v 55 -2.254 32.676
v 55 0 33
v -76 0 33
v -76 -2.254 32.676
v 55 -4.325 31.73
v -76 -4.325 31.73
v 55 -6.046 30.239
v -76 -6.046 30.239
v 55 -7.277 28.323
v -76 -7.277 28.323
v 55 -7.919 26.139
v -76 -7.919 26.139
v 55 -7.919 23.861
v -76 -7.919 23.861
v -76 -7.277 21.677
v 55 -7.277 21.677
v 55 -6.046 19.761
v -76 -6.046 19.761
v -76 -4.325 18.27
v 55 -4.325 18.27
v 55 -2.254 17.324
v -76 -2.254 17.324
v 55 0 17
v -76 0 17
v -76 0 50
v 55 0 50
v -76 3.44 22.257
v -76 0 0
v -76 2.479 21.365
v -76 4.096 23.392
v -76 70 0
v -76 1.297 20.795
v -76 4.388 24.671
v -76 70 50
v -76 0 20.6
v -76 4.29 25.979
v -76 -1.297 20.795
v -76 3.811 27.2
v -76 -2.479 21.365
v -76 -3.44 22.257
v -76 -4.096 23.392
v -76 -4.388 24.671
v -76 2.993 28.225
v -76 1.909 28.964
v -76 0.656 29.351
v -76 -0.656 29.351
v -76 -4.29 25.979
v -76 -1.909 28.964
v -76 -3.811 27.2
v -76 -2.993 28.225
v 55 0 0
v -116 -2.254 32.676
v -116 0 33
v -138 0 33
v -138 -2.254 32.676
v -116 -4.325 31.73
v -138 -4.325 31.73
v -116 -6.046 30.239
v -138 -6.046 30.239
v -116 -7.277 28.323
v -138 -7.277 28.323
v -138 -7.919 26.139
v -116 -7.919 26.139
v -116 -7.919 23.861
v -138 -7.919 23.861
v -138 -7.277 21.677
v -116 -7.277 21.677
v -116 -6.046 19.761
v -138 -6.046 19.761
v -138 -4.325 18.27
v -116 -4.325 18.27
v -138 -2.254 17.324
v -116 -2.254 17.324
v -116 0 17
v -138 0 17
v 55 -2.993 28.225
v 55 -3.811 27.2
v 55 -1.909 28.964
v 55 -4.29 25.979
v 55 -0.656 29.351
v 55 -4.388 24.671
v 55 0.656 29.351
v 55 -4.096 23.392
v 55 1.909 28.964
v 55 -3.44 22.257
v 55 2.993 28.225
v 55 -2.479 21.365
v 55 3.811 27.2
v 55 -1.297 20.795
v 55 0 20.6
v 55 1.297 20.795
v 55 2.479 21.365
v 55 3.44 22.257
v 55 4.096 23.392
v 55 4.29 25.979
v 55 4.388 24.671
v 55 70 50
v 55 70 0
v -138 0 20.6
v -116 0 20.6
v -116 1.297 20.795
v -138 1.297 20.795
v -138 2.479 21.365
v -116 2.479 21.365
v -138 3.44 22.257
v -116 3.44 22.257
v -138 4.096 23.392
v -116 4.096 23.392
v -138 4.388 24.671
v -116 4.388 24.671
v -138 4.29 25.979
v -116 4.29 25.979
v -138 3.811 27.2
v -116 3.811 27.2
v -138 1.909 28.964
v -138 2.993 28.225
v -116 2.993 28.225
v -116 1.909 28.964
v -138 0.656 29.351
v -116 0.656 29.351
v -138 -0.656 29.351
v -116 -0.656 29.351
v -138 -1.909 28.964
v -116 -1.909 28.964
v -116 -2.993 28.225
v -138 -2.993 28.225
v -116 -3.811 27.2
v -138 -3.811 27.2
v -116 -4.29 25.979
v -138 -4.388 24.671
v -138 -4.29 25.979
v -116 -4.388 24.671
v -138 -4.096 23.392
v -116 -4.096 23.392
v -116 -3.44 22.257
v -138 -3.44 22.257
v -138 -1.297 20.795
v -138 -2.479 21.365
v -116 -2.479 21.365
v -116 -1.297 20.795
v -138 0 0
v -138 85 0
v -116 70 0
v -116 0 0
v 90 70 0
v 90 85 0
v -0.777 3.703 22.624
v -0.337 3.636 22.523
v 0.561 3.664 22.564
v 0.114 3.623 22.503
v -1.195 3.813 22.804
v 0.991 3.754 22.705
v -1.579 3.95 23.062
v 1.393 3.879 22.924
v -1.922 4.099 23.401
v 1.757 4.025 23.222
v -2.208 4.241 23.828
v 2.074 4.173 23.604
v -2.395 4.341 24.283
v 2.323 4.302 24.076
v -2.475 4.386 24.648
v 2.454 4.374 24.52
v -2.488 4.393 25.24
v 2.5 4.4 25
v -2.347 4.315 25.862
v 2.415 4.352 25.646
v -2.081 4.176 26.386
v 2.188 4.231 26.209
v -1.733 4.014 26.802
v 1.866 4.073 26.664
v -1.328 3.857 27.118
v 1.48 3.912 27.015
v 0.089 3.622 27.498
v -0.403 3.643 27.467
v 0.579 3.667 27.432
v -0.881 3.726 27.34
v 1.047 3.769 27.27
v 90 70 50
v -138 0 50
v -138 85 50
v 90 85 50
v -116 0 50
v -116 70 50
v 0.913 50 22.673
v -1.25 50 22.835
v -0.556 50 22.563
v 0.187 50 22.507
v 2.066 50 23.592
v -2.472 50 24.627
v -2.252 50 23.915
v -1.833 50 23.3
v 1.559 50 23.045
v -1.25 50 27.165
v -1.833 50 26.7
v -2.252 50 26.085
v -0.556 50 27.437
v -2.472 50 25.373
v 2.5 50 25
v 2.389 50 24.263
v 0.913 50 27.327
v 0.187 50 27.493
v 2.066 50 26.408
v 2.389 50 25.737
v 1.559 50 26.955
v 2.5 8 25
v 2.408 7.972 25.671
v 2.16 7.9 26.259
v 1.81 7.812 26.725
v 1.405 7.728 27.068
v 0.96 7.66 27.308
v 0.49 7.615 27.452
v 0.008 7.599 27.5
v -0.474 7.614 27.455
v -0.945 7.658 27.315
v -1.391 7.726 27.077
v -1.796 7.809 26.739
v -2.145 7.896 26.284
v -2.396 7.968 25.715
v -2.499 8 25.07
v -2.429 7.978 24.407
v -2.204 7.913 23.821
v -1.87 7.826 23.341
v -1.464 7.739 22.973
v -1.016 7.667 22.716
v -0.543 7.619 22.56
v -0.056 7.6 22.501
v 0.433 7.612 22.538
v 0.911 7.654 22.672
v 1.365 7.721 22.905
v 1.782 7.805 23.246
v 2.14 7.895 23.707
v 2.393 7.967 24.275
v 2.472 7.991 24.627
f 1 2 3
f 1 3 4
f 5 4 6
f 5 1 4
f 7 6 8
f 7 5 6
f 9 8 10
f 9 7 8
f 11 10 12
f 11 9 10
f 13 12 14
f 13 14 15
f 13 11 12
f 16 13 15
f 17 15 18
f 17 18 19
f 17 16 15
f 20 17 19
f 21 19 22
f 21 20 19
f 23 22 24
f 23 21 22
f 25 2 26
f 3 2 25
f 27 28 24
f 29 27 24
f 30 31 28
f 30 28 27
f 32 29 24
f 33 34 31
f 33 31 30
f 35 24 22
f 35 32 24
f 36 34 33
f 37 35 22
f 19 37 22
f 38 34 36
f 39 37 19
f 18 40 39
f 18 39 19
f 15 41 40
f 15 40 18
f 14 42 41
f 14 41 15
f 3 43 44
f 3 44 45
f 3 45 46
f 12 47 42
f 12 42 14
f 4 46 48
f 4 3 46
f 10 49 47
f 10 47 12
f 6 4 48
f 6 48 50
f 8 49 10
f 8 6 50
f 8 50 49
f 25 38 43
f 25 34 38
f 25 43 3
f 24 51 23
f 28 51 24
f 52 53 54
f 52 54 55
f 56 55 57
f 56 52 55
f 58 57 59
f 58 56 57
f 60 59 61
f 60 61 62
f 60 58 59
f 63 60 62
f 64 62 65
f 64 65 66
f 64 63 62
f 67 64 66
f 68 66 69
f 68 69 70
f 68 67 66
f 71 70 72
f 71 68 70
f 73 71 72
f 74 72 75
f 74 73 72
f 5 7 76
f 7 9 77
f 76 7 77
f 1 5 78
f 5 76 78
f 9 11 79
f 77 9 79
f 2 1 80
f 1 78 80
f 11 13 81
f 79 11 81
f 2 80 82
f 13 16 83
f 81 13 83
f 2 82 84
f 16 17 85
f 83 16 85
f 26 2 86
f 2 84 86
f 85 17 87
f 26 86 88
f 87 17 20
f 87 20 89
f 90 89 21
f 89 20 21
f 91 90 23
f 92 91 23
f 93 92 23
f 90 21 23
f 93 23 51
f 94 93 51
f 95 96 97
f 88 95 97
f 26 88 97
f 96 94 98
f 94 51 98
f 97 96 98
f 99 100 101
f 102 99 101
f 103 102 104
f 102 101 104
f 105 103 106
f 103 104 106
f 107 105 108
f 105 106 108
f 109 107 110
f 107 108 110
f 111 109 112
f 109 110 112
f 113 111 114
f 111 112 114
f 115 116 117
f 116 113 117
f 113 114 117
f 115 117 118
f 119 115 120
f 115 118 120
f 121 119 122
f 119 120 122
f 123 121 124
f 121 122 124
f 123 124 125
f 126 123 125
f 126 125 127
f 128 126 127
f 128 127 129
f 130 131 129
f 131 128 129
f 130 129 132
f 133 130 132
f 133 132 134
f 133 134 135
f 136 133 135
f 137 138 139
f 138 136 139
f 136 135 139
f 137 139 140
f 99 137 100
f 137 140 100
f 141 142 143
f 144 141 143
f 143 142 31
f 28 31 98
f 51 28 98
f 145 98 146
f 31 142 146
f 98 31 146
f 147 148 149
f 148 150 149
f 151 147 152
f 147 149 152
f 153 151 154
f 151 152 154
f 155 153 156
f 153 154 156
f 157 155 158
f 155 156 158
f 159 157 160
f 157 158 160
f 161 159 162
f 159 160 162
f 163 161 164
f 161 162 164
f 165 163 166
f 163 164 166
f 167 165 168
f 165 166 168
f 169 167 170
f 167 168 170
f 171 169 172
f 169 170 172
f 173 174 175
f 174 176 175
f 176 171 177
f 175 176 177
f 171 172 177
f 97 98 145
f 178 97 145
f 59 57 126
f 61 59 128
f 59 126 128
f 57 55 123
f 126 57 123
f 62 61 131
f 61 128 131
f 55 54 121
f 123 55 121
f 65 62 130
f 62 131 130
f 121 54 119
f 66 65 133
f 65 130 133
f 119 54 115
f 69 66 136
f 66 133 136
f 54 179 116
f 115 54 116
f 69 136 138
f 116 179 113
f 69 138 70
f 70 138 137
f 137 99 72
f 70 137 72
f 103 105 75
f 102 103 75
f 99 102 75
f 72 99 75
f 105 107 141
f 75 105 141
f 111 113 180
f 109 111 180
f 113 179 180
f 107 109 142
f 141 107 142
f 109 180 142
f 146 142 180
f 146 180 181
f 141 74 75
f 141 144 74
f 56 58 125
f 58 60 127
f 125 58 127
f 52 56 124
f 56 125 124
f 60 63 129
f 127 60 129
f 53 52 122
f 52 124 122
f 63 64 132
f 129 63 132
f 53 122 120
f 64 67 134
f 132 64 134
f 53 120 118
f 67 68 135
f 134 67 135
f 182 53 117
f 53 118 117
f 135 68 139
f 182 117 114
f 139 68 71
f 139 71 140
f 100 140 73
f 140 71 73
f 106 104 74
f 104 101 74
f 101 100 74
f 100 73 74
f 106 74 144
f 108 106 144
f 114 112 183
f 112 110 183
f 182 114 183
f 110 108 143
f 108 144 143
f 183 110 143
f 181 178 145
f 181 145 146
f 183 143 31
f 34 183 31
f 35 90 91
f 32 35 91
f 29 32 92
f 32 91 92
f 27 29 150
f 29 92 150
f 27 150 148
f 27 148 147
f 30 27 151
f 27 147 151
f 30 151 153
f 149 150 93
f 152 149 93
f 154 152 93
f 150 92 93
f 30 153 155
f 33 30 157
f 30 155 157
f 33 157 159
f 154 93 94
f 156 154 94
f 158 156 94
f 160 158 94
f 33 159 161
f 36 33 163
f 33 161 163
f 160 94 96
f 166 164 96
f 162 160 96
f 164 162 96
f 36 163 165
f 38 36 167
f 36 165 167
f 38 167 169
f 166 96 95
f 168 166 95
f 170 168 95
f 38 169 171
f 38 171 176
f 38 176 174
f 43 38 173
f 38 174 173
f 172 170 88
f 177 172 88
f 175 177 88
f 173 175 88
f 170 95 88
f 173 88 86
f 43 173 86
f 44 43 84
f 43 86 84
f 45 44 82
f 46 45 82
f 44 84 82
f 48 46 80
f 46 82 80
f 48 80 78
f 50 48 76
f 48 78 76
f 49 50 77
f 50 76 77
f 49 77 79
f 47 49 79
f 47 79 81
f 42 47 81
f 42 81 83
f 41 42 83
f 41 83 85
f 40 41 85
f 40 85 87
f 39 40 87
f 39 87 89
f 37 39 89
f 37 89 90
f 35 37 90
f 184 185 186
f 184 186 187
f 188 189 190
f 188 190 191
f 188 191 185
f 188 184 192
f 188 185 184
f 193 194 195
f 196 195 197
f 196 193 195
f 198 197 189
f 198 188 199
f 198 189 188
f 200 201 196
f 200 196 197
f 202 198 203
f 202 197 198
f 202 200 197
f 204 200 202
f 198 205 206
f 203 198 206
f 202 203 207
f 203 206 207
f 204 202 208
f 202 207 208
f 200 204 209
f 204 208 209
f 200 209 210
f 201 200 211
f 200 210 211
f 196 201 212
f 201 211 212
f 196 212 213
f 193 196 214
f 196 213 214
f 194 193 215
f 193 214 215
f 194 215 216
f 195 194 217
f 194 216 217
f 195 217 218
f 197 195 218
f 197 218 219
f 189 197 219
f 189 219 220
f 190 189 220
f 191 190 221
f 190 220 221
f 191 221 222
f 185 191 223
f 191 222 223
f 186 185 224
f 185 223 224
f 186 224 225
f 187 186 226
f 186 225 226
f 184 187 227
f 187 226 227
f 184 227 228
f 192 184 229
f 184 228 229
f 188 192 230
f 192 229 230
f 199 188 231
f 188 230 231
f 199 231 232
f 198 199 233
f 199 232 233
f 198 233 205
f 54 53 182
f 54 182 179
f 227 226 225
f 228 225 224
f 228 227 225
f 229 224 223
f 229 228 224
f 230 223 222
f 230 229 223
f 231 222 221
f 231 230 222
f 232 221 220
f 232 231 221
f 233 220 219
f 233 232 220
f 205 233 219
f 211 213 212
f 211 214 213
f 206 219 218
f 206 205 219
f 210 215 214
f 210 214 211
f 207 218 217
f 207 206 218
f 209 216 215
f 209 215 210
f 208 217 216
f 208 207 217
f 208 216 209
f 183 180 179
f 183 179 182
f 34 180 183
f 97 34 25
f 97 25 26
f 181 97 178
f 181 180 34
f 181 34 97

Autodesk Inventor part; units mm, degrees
ref_plane "YZ Plane" through (0, 0, 0) normal (1, 0, 0) x (0, 1, 0)
ref_plane "XZ Plane" through (0, 0, 0) normal (0, 1, 0) x (-1, 0, 0)
ref_plane "XY Plane" through (0, 0, 0) normal (0, 0, 1) x (1, 0, 0)
sketch "Sketch1" plane through (0, 0, 0) normal (0, 0, 1) x (1, 0, 0)
  line L0 (0, 0) -> (55, 0)
  line L1 (0, 0) -> (-76, 0)
  line L2 (-116, 0) -> (-138, 0)
  line L3 (-138, 0) -> (-138, 70)
  line L4 (-138, 70) -> (-138, 85)
  line L5 (-138, 85) -> (-116, 85)
  line L6 (-116, 0) -> (-116, 70)
  line L7 (-116, 70) -> (-76, 70)
  line L8 (-76, 70) -> (-76, 0)
  line L9 (90, 70) -> (90, 85)
  line L10 (90, 85) -> (-116, 85)
  line L11 (55, 0) -> (55, 70)
  line L12 (55, 70) -> (90, 70)
  line L13 (55, 0) -> (-76, 0)
  line L14 (-116, 0) -> (-117.6, 0)
  line L15 (-117.6, 0) -> (-117.6, 71.4164)
  line L16 (-117.6, 71.4164) -> (-74.4045, 71.4164)
  line L17 (-74.4045, 71.4164) -> (-74.4045, 0)
  line L18 (-138, 0) -> (-152.8138, 0)
  line L19 (-152.8138, 0) -> (-152.8138, 85)
  line L20 (-152.8138, 85) -> (-138, 85)
  dimension "d20" = 1.6
extrude "Extrusion1" add sketch "Sketch1" along normal blind 50 contours L1 L17 L16 L15 L2 L3 L4 L5 L10 L9 L12 L11 L0 | L1 L8 L7 L6 L2 L15 L16 L17
sketch "Sketch2" plane through (0, 0, 0) normal (1, 0, 0) x (0, 1, 0)
  point P0 (0, 0)
sketch "Sketch3" plane through (-76, 0, 0) normal (0, -1, 0) x (1, 0, 0)
  line L0 (131, 0) -> (131, 50) projected
  line L1 (131, 25) -> (76, 25)
  circle A0 centre (76, 25) radius 2.5
  point P0 (76, 0)
  dimension "d9" = 5
extrude "Extrusion2" cut sketch "Sketch3" against normal blind 50
sketch "Sketch4" plane through (55, 0, 0) normal (1, 0, 0) x (0, 0, -1)
  line L0 (0, 0) -> (-50, 0) projected
  circle A0 centre (-25, 0) radius 4.4
  dimension "d12" = 8.8
extrude "Extrusion3" cut sketch "Sketch4" against normal blind 238.5
sketch "Sketch5" plane through (55, 0, 0) normal (1, 0, 0) x (0, 0, -1)
  arc A0 (-20.6, 0) -> (-29.4, 0) centre (-25, 0) ccw projected
  circle A1 centre (-25, 0) radius 8
  circle A2 centre (-25, 0) radius 4.4
  point P0 (0, 0)
  dimension "d15" = 16
extrude "Extrusion4" add sketch "Sketch5" against normal up to surface (193 mm away)
sketch "Sketch6" plane through (0, 0, 50) normal (0, 0, 1) x (1, 0, 0)
  line L0 (-116, 0) -> (-116, 70) projected
  line L1 (-116, 13.3517) -> (-76, 13.3517)
  line L2 (-76, 13.3517) -> (-76, -16.9742)
  line L3 (-76, -16.9742) -> (-116, -16.9742)
  line L4 (-116, -16.9742) -> (-116, 13.3517)
  point P0 (0, 0)
extrude "Extrusion5" cut sketch "Sketch6" against normal blind 238.5
properties part number "Arm_Base"
